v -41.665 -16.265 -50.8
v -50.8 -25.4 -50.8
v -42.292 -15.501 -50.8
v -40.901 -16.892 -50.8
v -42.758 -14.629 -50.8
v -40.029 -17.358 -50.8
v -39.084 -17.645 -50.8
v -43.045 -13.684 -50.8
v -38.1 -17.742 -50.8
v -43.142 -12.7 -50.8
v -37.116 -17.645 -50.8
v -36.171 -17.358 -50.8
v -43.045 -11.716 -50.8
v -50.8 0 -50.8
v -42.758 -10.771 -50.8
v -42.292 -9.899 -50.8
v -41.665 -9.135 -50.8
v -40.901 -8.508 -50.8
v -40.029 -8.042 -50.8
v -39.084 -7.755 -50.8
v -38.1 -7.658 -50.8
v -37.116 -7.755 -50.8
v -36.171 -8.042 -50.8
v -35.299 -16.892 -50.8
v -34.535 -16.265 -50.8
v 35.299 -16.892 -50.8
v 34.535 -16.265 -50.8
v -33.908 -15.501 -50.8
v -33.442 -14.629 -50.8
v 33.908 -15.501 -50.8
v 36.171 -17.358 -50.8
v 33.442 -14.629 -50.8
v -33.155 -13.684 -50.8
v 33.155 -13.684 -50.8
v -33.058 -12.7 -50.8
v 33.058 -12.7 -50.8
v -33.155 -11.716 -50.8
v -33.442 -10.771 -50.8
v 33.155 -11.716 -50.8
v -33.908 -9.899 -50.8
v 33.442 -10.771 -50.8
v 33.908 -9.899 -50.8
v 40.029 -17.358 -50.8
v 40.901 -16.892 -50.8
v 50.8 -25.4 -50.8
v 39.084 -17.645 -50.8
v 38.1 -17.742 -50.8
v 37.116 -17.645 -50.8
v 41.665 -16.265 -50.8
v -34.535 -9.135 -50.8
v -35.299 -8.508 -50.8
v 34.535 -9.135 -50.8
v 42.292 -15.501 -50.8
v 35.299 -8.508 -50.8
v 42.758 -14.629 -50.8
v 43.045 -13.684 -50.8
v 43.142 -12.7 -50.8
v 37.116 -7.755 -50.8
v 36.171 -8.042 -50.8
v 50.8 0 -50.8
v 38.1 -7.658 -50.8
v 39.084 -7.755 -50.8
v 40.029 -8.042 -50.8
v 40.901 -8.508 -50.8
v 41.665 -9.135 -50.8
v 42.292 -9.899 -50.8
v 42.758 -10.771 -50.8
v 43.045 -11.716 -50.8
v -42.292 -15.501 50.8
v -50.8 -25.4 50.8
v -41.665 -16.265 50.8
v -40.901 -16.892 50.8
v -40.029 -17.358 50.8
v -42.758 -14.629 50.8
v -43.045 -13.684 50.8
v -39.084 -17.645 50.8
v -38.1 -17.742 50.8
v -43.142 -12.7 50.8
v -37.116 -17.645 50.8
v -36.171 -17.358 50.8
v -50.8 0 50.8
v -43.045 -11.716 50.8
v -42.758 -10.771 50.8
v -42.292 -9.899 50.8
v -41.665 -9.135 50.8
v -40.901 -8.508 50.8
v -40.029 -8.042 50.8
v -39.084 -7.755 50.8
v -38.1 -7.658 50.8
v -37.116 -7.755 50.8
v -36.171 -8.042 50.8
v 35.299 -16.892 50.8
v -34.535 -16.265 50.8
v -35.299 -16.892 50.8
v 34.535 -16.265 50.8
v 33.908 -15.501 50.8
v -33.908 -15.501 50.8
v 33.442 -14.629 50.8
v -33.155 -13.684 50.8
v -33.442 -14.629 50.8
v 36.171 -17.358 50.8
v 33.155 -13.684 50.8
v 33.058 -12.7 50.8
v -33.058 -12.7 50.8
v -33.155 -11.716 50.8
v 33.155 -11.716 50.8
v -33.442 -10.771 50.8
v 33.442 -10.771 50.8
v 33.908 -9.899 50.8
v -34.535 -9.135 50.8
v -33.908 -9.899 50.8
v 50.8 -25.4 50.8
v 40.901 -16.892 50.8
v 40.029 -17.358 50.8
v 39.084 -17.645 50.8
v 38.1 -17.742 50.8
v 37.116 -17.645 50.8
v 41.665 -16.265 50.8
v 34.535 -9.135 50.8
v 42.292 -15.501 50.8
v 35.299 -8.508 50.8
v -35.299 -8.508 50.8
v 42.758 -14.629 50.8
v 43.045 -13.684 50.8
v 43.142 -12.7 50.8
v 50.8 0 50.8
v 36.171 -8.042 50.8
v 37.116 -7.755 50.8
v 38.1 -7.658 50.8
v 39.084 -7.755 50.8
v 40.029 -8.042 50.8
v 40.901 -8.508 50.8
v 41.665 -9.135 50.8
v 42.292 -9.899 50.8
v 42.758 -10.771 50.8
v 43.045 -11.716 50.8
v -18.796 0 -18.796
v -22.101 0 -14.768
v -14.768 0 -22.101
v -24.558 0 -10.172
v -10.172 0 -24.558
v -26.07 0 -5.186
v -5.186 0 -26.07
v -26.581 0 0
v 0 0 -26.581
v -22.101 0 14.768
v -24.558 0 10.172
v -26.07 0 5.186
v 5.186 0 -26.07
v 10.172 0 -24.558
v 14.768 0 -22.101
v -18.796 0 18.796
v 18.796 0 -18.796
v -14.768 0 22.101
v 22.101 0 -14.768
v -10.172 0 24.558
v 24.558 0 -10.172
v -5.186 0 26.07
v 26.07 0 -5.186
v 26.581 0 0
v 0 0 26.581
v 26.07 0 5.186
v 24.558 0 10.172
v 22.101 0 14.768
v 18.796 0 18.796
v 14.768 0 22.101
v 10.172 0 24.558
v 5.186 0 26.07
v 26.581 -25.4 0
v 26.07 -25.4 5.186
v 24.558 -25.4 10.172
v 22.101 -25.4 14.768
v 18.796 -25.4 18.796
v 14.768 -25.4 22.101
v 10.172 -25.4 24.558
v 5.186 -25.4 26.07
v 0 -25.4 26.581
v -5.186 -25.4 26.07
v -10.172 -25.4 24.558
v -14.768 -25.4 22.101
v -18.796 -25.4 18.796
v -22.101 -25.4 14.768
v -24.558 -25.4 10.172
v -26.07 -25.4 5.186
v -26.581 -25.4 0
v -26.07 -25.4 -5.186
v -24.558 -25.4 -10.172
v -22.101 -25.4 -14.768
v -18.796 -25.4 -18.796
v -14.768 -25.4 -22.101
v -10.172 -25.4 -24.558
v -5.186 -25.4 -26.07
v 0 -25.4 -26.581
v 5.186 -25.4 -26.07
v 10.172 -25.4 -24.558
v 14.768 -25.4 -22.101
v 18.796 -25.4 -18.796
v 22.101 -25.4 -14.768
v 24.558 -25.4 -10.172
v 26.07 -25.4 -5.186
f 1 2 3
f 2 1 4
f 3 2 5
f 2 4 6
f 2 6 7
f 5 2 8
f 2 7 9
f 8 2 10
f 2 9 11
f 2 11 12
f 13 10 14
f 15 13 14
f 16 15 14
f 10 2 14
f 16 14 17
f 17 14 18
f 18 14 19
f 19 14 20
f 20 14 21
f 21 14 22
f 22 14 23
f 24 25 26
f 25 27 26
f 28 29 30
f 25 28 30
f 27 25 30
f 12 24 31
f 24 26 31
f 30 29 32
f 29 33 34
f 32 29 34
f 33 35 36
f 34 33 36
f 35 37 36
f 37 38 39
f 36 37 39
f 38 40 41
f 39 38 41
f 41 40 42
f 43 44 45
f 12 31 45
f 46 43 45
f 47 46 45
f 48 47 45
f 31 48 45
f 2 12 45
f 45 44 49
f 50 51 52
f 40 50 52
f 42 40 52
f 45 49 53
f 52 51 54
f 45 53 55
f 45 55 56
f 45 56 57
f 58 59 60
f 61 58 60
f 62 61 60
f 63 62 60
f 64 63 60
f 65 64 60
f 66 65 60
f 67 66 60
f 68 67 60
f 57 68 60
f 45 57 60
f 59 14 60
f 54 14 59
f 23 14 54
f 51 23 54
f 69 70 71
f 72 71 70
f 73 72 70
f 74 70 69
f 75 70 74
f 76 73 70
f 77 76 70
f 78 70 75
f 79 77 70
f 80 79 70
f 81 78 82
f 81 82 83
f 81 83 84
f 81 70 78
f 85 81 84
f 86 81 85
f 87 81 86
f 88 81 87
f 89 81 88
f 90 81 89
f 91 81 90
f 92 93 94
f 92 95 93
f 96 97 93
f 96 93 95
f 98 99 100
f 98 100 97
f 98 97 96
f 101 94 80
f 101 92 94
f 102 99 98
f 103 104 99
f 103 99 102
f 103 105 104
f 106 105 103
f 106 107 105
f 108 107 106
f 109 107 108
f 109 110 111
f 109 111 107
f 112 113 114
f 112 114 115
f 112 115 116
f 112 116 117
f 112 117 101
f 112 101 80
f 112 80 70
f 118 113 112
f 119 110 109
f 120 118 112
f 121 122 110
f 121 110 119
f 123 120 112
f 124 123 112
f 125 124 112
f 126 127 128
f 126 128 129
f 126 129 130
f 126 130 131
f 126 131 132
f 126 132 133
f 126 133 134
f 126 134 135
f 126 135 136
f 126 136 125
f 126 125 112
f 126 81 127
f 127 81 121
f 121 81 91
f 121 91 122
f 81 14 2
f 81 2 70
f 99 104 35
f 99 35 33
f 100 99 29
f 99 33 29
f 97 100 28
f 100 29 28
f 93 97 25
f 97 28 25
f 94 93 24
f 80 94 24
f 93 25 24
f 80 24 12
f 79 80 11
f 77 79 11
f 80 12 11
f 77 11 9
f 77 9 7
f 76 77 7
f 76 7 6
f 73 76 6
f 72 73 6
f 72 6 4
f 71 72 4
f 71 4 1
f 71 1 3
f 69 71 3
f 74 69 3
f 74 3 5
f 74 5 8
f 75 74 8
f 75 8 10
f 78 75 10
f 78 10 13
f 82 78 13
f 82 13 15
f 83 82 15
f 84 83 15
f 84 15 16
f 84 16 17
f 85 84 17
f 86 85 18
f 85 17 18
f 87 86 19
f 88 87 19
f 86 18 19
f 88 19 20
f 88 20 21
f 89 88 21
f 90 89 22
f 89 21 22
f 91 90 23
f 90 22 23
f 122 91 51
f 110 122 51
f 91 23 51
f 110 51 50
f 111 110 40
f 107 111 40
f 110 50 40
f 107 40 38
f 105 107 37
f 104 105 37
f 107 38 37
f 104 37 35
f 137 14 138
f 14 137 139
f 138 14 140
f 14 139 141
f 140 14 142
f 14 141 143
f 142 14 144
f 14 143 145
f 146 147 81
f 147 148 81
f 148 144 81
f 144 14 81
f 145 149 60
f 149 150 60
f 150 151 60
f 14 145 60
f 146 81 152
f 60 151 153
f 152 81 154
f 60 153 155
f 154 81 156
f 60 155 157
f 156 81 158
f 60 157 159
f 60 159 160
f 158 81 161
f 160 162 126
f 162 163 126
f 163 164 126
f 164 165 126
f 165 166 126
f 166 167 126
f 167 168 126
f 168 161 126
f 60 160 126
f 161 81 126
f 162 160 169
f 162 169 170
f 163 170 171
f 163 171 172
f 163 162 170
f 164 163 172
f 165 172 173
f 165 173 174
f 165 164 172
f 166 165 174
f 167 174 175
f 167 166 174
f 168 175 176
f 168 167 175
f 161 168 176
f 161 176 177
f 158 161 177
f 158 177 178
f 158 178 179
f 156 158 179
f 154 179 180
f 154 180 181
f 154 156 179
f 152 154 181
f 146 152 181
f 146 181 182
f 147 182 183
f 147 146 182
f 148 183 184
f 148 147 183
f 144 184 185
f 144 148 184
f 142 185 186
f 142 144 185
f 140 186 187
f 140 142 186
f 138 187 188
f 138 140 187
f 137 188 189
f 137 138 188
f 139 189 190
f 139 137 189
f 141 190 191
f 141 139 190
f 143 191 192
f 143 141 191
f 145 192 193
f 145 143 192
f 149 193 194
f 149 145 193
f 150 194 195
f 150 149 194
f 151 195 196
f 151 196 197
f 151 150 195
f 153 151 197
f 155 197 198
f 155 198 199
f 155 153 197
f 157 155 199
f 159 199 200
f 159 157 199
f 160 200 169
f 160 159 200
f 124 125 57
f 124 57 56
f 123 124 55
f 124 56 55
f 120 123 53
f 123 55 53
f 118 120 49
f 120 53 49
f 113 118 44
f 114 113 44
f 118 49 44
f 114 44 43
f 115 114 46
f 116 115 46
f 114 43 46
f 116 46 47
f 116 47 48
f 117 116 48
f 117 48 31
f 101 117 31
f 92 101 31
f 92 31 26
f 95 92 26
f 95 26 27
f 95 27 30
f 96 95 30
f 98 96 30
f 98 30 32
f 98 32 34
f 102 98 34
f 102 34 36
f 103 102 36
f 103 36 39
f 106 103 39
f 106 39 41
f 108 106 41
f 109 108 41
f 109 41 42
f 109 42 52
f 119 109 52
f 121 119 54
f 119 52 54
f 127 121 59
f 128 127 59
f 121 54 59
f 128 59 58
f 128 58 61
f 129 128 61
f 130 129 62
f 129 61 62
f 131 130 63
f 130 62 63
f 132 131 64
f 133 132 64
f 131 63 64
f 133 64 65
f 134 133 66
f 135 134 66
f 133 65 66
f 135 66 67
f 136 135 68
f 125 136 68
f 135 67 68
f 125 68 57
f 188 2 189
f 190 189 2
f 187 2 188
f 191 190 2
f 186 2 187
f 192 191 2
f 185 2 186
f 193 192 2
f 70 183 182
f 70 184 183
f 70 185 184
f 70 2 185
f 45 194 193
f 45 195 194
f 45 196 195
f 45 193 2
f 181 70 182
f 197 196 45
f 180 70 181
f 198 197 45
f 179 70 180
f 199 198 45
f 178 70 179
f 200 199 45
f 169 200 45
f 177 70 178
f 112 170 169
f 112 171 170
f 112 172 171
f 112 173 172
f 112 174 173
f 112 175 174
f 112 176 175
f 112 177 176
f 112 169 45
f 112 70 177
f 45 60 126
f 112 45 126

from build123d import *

# Parameters (mm, degrees)
F0_W     = 101.6
F0_H     = 101.6
F0_R     = 26.5811
F1_DEPTH = 25.4
F2_R     = 5.0419
F3_DEPTH = 101.601


with BuildPart() as f1:
    # F0 (on Front) → F1 (new body)
    with BuildSketch(Plane.XZ):
        Rectangle(F0_W, F0_H)
        Circle(F0_R, mode=Mode.SUBTRACT)
    extrude(amount=F1_DEPTH)

    # F2 (on face) → F3 (cut, through all)
    with BuildSketch(Plane(origin=(0, 0, -50.8), x_dir=(1, 0, 0), z_dir=(0, 0, -1))):
        with Locations((-38.1, 12.7)):
            Circle(F2_R)
        with Locations((38.1, 12.7)):
            Circle(F2_R)
    extrude(amount=-F3_DEPTH, mode=Mode.SUBTRACT)


solid = f1.part
